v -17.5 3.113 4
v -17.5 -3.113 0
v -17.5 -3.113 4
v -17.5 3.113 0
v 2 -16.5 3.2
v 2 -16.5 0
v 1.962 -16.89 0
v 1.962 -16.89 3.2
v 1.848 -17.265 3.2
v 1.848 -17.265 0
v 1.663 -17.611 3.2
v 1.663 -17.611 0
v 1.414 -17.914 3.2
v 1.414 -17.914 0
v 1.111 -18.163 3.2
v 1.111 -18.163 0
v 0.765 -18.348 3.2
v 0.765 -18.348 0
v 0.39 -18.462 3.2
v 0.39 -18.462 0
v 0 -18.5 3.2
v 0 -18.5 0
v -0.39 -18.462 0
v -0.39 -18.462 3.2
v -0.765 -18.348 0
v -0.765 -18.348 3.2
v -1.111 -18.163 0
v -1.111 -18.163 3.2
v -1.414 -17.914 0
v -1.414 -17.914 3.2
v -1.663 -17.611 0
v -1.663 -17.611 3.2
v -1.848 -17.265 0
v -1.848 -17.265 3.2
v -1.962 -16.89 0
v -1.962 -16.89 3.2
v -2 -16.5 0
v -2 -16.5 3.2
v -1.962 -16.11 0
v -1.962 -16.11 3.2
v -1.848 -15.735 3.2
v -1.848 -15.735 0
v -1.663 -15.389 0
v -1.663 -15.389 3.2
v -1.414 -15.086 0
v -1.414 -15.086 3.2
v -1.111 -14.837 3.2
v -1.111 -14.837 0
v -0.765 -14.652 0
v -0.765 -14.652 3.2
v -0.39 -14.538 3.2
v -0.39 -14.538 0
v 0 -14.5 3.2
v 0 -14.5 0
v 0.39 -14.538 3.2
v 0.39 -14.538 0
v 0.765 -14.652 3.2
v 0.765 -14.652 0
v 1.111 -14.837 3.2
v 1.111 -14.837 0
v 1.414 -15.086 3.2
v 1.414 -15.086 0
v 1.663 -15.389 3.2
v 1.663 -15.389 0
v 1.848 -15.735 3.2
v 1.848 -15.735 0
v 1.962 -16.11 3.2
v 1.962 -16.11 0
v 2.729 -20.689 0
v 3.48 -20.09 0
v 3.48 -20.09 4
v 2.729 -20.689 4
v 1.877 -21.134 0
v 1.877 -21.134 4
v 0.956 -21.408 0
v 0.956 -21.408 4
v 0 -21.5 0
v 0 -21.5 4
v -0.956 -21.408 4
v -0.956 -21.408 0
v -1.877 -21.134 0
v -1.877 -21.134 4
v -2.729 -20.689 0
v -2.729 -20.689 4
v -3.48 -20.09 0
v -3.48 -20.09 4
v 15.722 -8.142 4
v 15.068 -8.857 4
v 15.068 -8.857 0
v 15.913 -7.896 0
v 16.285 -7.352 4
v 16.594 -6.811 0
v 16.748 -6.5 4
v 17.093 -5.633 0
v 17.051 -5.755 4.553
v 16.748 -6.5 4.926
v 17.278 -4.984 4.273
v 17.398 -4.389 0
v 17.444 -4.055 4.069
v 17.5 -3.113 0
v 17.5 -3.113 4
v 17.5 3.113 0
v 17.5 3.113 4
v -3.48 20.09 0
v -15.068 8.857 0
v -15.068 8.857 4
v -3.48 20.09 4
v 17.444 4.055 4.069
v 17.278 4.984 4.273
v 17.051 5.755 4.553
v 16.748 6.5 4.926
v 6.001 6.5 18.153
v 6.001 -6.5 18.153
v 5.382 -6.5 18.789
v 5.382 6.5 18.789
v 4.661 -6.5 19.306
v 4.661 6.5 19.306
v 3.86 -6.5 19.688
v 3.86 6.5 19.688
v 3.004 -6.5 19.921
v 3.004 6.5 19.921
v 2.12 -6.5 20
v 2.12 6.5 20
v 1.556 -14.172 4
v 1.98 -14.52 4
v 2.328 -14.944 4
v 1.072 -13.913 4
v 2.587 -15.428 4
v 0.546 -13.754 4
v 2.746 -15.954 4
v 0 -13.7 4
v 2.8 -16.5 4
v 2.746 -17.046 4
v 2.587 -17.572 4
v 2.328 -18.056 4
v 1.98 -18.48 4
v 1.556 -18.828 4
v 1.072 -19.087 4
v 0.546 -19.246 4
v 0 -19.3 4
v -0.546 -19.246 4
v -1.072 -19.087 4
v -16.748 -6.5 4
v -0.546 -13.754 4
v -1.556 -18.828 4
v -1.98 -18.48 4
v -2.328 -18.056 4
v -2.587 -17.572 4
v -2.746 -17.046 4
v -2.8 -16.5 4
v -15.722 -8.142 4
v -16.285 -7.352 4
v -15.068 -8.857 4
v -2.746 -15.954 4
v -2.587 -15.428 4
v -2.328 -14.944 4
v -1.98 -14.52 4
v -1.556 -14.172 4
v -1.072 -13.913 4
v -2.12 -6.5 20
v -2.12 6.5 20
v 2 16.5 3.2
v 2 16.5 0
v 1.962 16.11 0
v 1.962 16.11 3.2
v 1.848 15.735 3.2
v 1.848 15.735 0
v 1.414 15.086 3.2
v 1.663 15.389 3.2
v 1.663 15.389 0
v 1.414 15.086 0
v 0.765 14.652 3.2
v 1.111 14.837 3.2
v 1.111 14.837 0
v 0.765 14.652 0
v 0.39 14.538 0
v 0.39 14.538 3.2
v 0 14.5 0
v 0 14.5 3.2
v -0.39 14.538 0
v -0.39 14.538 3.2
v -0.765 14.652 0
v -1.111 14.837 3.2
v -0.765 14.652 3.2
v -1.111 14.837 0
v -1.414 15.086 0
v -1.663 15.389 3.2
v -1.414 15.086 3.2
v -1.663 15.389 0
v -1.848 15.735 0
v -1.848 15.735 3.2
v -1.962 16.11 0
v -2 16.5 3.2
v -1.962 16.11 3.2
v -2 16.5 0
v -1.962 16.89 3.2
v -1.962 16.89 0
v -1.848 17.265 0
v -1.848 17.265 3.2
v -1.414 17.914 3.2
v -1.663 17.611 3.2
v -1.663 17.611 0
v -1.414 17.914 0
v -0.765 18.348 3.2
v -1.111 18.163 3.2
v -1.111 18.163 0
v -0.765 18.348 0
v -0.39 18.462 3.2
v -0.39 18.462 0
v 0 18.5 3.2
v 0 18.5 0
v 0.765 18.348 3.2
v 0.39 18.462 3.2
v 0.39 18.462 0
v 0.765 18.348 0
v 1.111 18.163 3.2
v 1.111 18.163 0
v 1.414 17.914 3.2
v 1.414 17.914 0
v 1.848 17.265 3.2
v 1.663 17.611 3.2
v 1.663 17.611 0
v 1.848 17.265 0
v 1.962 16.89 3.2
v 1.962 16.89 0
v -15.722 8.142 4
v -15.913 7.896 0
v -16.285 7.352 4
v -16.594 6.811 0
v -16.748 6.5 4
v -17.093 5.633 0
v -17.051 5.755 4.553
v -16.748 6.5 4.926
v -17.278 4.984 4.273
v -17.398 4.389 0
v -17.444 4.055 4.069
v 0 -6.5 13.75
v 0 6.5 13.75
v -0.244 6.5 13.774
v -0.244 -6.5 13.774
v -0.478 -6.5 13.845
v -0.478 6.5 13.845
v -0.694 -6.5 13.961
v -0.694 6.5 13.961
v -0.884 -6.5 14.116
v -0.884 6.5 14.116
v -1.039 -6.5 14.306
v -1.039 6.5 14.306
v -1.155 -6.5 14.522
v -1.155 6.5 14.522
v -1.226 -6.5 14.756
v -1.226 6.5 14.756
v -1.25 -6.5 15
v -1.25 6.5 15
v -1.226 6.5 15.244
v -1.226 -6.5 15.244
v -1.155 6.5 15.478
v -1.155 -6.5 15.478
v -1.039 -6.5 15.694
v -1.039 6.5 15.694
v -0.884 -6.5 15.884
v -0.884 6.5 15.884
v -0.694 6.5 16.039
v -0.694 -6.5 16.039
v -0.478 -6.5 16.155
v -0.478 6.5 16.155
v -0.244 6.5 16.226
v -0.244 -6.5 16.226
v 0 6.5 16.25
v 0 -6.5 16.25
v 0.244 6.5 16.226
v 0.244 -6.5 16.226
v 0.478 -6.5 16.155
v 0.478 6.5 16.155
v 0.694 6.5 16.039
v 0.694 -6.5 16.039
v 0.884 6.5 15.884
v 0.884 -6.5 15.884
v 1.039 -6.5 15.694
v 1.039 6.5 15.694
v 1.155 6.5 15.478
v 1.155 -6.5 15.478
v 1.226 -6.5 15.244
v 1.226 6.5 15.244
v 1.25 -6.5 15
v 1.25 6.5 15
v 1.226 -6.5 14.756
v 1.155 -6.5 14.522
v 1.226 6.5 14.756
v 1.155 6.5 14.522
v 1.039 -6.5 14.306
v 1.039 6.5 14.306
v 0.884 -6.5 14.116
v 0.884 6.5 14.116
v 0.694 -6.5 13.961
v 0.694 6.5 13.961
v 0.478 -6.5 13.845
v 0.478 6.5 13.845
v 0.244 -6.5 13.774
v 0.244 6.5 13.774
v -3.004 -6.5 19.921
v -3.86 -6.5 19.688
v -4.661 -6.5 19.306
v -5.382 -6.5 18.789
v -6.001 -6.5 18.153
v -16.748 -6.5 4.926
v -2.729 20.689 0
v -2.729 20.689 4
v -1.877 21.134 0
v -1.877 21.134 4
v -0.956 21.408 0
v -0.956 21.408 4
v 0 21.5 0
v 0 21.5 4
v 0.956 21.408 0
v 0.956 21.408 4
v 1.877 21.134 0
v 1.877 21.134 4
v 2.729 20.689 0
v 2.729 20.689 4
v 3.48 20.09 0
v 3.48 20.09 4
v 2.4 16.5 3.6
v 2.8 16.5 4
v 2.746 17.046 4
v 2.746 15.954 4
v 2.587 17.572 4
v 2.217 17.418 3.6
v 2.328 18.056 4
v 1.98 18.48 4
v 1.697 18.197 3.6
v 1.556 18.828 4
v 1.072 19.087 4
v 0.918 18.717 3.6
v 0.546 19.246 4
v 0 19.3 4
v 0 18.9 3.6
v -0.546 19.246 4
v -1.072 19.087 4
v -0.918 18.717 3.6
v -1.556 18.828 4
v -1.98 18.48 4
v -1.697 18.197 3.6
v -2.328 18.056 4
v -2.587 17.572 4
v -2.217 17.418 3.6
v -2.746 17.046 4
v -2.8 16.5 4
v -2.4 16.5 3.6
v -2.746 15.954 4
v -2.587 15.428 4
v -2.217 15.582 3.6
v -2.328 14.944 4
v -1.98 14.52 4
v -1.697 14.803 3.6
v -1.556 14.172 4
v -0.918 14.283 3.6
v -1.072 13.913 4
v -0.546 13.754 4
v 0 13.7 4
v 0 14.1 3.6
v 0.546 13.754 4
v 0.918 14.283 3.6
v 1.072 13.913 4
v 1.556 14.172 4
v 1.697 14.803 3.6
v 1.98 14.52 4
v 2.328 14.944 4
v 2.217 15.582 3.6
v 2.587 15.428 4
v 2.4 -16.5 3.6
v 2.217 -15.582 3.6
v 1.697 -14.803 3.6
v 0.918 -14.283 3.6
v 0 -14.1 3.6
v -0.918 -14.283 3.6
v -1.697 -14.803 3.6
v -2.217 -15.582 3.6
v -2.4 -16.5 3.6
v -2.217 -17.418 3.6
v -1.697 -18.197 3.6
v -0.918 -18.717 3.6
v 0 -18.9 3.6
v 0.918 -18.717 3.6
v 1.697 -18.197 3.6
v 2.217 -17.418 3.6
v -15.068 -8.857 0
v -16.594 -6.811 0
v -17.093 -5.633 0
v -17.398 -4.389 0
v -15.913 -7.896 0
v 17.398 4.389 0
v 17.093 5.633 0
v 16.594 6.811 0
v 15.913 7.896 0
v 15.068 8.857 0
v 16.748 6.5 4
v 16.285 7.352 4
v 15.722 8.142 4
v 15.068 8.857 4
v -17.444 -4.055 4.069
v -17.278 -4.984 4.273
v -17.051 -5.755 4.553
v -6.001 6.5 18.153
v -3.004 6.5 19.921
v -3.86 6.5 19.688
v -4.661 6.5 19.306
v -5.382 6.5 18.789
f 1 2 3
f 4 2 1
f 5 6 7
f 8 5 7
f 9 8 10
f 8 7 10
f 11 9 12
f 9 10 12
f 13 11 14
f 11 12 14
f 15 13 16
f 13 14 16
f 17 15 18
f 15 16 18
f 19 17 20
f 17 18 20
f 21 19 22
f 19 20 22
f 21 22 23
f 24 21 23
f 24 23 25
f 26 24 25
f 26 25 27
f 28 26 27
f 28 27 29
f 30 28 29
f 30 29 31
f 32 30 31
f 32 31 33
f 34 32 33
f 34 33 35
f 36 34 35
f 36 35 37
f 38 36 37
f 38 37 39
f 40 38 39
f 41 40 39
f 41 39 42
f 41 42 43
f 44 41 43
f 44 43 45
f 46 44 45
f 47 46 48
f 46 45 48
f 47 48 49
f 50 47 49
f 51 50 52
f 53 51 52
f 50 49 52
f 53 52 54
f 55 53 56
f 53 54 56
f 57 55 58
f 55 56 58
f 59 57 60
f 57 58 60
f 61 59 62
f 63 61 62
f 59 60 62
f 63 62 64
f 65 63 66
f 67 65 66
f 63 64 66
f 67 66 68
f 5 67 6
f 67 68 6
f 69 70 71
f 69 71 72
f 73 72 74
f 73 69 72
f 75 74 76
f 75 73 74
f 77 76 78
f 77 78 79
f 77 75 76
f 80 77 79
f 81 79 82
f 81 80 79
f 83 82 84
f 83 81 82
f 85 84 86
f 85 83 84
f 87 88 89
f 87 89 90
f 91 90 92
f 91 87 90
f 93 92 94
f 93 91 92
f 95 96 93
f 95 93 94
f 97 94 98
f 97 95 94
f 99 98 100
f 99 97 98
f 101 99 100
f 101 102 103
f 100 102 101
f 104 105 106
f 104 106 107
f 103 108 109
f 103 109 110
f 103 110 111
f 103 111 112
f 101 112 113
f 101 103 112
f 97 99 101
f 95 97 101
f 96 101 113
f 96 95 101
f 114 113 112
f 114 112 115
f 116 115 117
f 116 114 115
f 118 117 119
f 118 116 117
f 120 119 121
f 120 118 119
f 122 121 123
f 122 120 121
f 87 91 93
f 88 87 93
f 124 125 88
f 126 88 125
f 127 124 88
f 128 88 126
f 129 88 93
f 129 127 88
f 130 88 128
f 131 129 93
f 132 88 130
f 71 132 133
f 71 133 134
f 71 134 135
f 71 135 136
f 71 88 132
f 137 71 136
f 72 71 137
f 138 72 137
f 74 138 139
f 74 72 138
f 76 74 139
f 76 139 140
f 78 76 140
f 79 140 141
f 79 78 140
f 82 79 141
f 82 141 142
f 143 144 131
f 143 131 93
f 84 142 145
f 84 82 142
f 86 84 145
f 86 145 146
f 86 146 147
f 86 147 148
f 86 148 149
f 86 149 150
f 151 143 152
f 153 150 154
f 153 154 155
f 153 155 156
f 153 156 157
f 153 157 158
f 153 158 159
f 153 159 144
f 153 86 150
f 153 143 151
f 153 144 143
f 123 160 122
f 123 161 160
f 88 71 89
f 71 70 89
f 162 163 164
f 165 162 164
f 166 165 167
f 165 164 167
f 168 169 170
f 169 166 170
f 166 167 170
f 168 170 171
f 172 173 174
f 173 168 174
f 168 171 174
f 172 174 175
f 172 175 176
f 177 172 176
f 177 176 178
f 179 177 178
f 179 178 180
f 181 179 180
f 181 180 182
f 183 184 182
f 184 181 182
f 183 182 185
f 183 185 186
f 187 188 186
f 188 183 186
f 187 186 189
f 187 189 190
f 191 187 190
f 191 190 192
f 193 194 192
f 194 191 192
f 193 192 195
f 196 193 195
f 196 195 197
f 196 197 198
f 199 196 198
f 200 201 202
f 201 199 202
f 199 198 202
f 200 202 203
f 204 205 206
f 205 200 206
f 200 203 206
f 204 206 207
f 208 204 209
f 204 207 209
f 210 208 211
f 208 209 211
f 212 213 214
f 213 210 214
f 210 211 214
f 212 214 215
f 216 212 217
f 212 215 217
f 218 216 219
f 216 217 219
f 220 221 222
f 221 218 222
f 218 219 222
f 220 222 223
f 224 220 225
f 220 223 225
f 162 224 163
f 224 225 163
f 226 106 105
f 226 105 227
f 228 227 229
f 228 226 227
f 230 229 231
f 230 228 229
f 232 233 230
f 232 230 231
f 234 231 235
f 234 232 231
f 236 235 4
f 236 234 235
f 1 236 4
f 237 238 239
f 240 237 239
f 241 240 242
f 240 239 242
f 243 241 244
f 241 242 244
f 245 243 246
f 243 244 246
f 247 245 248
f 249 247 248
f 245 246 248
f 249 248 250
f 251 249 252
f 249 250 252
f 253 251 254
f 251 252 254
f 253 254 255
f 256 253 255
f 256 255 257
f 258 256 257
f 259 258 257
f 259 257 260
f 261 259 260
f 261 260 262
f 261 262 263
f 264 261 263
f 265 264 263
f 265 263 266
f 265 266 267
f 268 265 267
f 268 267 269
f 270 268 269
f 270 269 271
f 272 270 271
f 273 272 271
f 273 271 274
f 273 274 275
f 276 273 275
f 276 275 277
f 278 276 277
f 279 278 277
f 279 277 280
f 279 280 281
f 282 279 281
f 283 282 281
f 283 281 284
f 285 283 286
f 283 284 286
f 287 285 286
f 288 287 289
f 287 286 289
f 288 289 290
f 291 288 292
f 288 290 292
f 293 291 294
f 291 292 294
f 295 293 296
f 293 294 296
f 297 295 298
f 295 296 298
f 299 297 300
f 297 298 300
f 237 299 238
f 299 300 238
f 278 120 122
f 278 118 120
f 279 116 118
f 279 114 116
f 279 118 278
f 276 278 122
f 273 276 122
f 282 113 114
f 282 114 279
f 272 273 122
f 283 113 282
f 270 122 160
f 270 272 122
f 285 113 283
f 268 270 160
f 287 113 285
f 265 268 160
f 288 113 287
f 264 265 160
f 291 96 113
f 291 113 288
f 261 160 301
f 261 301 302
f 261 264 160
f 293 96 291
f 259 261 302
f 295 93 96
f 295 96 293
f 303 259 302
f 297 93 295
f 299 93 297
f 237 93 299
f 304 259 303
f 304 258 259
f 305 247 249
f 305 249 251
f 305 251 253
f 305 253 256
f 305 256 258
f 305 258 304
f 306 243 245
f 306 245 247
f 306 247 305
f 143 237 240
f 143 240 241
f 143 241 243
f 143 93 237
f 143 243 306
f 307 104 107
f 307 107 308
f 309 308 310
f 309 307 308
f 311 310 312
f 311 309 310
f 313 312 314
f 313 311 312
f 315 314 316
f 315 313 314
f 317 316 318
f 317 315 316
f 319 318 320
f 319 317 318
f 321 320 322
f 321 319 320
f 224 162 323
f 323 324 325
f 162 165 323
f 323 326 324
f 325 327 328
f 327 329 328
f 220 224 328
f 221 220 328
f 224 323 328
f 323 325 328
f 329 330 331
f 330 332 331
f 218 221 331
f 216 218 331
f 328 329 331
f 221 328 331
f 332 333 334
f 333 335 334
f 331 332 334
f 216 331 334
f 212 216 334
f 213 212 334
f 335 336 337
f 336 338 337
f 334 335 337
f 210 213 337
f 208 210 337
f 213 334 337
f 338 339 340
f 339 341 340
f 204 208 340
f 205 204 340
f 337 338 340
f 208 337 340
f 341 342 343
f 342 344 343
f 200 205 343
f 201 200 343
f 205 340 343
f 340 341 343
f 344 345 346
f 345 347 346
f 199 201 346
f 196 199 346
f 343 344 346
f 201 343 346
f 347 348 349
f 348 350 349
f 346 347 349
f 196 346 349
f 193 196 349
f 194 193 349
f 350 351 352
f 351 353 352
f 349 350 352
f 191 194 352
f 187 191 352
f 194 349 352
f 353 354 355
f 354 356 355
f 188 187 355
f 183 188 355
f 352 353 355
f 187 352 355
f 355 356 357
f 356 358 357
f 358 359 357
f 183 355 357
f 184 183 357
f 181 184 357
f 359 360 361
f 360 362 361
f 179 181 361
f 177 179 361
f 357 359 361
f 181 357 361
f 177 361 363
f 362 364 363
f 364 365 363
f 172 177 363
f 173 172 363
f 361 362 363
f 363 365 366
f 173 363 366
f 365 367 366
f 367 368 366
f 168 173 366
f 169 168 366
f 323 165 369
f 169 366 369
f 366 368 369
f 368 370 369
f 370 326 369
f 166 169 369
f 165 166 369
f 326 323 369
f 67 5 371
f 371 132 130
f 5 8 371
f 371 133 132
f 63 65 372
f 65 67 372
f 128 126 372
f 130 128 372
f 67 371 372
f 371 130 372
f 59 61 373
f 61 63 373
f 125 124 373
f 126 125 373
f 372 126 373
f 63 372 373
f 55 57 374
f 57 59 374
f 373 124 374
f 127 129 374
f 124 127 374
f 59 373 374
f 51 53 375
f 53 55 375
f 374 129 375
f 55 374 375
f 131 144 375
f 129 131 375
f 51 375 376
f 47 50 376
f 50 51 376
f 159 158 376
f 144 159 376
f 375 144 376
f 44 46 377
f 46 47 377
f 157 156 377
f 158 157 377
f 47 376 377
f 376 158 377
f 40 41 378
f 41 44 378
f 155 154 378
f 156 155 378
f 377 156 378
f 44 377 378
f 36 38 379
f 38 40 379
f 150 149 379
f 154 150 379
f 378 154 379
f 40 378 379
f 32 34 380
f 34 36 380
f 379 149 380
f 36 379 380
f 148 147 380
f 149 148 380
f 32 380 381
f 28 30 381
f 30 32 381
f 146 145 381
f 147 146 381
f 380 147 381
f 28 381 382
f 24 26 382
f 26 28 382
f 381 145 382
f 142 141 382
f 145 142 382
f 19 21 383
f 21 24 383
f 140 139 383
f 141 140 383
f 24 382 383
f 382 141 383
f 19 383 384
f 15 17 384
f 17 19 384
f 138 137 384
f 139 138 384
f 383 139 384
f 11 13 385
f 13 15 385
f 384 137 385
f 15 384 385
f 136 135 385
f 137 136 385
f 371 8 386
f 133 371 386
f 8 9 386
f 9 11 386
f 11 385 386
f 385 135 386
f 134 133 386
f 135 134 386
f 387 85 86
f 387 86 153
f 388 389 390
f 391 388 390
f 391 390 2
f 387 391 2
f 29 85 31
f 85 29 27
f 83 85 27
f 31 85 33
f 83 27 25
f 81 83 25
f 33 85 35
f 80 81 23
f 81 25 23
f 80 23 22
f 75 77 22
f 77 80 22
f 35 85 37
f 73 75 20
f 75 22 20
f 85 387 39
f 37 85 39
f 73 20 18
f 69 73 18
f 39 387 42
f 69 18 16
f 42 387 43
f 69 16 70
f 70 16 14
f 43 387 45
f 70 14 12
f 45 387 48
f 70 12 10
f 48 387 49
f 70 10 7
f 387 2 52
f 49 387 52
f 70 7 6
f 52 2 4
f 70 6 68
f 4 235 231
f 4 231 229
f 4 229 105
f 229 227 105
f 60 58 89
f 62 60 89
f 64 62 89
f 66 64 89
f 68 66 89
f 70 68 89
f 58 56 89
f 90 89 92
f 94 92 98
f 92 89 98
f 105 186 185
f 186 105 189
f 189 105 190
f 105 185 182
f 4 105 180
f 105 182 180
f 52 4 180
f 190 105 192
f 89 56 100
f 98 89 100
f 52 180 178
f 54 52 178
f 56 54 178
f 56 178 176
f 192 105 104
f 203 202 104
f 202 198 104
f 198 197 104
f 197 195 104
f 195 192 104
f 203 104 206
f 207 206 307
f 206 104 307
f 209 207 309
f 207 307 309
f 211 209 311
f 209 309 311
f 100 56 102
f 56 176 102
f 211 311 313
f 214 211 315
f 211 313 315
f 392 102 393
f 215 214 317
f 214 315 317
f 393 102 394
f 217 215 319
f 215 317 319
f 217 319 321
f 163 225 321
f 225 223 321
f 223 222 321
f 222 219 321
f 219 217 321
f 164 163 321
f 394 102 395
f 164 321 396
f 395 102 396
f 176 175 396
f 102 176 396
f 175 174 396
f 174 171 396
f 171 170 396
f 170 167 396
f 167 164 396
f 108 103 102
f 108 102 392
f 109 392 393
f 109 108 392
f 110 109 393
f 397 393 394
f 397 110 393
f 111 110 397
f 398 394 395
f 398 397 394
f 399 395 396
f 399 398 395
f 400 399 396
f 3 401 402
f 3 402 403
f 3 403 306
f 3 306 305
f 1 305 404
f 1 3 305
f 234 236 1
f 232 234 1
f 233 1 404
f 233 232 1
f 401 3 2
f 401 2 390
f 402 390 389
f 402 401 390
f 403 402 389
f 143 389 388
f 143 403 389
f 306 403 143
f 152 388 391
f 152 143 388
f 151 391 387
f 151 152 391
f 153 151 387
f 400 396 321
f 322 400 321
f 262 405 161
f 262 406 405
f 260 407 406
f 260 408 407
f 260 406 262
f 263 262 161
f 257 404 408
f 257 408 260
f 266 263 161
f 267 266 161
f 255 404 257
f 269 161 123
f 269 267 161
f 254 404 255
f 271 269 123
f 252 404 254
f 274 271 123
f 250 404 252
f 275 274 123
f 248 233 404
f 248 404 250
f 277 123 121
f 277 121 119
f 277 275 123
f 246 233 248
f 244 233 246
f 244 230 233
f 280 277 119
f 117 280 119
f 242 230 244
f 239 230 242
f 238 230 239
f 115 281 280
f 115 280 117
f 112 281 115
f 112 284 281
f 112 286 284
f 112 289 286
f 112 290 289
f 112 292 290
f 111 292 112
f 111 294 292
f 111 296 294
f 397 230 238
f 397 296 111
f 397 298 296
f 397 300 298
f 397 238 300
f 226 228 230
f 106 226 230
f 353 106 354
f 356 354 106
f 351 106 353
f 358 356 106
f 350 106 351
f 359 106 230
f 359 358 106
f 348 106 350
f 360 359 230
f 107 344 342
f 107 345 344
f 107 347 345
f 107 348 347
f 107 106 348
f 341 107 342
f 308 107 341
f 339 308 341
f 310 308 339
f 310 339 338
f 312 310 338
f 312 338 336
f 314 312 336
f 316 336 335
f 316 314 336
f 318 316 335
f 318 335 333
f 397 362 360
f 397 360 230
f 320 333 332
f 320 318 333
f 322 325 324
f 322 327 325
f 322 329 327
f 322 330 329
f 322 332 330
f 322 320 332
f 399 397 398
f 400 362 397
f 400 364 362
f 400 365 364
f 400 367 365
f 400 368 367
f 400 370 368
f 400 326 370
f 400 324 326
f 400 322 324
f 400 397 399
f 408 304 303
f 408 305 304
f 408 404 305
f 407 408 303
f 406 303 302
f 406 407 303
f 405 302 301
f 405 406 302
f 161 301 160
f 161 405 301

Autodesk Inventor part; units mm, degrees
ref_plane "YZ Plane" through (0, 0, 0) normal (1, 0, 0) x (0, 1, 0)
ref_plane "XZ Plane" through (0, 0, 0) normal (0, 1, 0) x (-1, 0, 0)
ref_plane "XY Plane" through (0, 0, 0) normal (0, 0, 1) x (1, 0, 0)
sketch "Sketch1" plane through (0, 0, 0) normal (0, 0, 1) x (1, 0, 0)
  line L0 (-17.5, 6.5) -> (17.5, 6.5)
  line L1 (17.5, 6.5) -> (17.5, -6.5)
  line L2 (17.5, -6.5) -> (-17.5, -6.5)
  line L3 (-17.5, -6.5) -> (-17.5, 6.5)
  circle A0 centre (0, 16.5) radius 5
  line L4 (-17.5, 6.5) -> (-3.4801, 20.0901)
  line L5 (17.5, 6.5) -> (3.4801, 20.0901)
  circle A1 centre (0, 16.5) radius 2
  point P0 (0, 0)
  dimension "d0" = 35
  dimension "d1" = 13
  dimension "d5" = 17.5
  dimension "d6" = 6.5
  dimension "d13" = 10
  dimension "d14" = 10
  dimension "d15" = 4
extrude "Extrusion1" add sketch "Sketch1" along normal blind 20 contours L0 L1 L2 L3
extrude "Extrusion3" add sketch "Sketch1" along normal blind 4 contours L4 A0 L5 L0 | A0
mirror "Mirror3" about plane through (0, 0, 0) normal (0, 1, 0) of "Extrusion3"
chamfer "Chamfer1" distance 13 distance2 16 1 edges at (17.5, 0, 20) measured on face at (5.8333, -2.1667, 20)
chamfer "Chamfer2" distance 13 distance2 16 1 edges at (-17.5, 0, 20) measured on face at (-2.8333, -2.1667, 20)
sketch "Sketch2" plane through (-17.5, -6.5, 4) normal (0, -1, 0) x (1, 0, 0)
  line L0 (0, 0) -> (13, 16) projected
  line L1 (0, 0) -> (35, 0) projected
  line L2 (22, 16) -> (35, 0) projected
  line L3 (13, 16) -> (22, 16) projected
  point P0 (17.5, -4)
  point P1 (17.5, 11)
  dimension "d24" = 35
  dimension "d25" = 17.5
  dimension "d26" = 5
hole "Hole1" at (0, -6.5, 15) direction (0, 1, 0) diameter 2.5 end through all
fillet "Fillet1" radius 5 2 edges at (-4.5, 0, 20) (4.5, 0, 20)
fillet "Fillet2" radius 8 4 edges at (-17.5, -6.5, 2) (-17.5, 6.5, 2) (17.5, -6.5, 2) (17.5, 6.5, 2)
chamfer "Chamfer3" distance 0.8 angle 45 2 edges at (-2, -16.5, 4) (-2, 16.5, 4)
equation "\"d5\" = 0.5 * d0"
equation "\"d6\" = 0.5 * d1"
equation "\"d25\" = 0.5 * d24"
properties part number "3DP_PLA_Part_Detector_Base" material "ABS Plastic"
